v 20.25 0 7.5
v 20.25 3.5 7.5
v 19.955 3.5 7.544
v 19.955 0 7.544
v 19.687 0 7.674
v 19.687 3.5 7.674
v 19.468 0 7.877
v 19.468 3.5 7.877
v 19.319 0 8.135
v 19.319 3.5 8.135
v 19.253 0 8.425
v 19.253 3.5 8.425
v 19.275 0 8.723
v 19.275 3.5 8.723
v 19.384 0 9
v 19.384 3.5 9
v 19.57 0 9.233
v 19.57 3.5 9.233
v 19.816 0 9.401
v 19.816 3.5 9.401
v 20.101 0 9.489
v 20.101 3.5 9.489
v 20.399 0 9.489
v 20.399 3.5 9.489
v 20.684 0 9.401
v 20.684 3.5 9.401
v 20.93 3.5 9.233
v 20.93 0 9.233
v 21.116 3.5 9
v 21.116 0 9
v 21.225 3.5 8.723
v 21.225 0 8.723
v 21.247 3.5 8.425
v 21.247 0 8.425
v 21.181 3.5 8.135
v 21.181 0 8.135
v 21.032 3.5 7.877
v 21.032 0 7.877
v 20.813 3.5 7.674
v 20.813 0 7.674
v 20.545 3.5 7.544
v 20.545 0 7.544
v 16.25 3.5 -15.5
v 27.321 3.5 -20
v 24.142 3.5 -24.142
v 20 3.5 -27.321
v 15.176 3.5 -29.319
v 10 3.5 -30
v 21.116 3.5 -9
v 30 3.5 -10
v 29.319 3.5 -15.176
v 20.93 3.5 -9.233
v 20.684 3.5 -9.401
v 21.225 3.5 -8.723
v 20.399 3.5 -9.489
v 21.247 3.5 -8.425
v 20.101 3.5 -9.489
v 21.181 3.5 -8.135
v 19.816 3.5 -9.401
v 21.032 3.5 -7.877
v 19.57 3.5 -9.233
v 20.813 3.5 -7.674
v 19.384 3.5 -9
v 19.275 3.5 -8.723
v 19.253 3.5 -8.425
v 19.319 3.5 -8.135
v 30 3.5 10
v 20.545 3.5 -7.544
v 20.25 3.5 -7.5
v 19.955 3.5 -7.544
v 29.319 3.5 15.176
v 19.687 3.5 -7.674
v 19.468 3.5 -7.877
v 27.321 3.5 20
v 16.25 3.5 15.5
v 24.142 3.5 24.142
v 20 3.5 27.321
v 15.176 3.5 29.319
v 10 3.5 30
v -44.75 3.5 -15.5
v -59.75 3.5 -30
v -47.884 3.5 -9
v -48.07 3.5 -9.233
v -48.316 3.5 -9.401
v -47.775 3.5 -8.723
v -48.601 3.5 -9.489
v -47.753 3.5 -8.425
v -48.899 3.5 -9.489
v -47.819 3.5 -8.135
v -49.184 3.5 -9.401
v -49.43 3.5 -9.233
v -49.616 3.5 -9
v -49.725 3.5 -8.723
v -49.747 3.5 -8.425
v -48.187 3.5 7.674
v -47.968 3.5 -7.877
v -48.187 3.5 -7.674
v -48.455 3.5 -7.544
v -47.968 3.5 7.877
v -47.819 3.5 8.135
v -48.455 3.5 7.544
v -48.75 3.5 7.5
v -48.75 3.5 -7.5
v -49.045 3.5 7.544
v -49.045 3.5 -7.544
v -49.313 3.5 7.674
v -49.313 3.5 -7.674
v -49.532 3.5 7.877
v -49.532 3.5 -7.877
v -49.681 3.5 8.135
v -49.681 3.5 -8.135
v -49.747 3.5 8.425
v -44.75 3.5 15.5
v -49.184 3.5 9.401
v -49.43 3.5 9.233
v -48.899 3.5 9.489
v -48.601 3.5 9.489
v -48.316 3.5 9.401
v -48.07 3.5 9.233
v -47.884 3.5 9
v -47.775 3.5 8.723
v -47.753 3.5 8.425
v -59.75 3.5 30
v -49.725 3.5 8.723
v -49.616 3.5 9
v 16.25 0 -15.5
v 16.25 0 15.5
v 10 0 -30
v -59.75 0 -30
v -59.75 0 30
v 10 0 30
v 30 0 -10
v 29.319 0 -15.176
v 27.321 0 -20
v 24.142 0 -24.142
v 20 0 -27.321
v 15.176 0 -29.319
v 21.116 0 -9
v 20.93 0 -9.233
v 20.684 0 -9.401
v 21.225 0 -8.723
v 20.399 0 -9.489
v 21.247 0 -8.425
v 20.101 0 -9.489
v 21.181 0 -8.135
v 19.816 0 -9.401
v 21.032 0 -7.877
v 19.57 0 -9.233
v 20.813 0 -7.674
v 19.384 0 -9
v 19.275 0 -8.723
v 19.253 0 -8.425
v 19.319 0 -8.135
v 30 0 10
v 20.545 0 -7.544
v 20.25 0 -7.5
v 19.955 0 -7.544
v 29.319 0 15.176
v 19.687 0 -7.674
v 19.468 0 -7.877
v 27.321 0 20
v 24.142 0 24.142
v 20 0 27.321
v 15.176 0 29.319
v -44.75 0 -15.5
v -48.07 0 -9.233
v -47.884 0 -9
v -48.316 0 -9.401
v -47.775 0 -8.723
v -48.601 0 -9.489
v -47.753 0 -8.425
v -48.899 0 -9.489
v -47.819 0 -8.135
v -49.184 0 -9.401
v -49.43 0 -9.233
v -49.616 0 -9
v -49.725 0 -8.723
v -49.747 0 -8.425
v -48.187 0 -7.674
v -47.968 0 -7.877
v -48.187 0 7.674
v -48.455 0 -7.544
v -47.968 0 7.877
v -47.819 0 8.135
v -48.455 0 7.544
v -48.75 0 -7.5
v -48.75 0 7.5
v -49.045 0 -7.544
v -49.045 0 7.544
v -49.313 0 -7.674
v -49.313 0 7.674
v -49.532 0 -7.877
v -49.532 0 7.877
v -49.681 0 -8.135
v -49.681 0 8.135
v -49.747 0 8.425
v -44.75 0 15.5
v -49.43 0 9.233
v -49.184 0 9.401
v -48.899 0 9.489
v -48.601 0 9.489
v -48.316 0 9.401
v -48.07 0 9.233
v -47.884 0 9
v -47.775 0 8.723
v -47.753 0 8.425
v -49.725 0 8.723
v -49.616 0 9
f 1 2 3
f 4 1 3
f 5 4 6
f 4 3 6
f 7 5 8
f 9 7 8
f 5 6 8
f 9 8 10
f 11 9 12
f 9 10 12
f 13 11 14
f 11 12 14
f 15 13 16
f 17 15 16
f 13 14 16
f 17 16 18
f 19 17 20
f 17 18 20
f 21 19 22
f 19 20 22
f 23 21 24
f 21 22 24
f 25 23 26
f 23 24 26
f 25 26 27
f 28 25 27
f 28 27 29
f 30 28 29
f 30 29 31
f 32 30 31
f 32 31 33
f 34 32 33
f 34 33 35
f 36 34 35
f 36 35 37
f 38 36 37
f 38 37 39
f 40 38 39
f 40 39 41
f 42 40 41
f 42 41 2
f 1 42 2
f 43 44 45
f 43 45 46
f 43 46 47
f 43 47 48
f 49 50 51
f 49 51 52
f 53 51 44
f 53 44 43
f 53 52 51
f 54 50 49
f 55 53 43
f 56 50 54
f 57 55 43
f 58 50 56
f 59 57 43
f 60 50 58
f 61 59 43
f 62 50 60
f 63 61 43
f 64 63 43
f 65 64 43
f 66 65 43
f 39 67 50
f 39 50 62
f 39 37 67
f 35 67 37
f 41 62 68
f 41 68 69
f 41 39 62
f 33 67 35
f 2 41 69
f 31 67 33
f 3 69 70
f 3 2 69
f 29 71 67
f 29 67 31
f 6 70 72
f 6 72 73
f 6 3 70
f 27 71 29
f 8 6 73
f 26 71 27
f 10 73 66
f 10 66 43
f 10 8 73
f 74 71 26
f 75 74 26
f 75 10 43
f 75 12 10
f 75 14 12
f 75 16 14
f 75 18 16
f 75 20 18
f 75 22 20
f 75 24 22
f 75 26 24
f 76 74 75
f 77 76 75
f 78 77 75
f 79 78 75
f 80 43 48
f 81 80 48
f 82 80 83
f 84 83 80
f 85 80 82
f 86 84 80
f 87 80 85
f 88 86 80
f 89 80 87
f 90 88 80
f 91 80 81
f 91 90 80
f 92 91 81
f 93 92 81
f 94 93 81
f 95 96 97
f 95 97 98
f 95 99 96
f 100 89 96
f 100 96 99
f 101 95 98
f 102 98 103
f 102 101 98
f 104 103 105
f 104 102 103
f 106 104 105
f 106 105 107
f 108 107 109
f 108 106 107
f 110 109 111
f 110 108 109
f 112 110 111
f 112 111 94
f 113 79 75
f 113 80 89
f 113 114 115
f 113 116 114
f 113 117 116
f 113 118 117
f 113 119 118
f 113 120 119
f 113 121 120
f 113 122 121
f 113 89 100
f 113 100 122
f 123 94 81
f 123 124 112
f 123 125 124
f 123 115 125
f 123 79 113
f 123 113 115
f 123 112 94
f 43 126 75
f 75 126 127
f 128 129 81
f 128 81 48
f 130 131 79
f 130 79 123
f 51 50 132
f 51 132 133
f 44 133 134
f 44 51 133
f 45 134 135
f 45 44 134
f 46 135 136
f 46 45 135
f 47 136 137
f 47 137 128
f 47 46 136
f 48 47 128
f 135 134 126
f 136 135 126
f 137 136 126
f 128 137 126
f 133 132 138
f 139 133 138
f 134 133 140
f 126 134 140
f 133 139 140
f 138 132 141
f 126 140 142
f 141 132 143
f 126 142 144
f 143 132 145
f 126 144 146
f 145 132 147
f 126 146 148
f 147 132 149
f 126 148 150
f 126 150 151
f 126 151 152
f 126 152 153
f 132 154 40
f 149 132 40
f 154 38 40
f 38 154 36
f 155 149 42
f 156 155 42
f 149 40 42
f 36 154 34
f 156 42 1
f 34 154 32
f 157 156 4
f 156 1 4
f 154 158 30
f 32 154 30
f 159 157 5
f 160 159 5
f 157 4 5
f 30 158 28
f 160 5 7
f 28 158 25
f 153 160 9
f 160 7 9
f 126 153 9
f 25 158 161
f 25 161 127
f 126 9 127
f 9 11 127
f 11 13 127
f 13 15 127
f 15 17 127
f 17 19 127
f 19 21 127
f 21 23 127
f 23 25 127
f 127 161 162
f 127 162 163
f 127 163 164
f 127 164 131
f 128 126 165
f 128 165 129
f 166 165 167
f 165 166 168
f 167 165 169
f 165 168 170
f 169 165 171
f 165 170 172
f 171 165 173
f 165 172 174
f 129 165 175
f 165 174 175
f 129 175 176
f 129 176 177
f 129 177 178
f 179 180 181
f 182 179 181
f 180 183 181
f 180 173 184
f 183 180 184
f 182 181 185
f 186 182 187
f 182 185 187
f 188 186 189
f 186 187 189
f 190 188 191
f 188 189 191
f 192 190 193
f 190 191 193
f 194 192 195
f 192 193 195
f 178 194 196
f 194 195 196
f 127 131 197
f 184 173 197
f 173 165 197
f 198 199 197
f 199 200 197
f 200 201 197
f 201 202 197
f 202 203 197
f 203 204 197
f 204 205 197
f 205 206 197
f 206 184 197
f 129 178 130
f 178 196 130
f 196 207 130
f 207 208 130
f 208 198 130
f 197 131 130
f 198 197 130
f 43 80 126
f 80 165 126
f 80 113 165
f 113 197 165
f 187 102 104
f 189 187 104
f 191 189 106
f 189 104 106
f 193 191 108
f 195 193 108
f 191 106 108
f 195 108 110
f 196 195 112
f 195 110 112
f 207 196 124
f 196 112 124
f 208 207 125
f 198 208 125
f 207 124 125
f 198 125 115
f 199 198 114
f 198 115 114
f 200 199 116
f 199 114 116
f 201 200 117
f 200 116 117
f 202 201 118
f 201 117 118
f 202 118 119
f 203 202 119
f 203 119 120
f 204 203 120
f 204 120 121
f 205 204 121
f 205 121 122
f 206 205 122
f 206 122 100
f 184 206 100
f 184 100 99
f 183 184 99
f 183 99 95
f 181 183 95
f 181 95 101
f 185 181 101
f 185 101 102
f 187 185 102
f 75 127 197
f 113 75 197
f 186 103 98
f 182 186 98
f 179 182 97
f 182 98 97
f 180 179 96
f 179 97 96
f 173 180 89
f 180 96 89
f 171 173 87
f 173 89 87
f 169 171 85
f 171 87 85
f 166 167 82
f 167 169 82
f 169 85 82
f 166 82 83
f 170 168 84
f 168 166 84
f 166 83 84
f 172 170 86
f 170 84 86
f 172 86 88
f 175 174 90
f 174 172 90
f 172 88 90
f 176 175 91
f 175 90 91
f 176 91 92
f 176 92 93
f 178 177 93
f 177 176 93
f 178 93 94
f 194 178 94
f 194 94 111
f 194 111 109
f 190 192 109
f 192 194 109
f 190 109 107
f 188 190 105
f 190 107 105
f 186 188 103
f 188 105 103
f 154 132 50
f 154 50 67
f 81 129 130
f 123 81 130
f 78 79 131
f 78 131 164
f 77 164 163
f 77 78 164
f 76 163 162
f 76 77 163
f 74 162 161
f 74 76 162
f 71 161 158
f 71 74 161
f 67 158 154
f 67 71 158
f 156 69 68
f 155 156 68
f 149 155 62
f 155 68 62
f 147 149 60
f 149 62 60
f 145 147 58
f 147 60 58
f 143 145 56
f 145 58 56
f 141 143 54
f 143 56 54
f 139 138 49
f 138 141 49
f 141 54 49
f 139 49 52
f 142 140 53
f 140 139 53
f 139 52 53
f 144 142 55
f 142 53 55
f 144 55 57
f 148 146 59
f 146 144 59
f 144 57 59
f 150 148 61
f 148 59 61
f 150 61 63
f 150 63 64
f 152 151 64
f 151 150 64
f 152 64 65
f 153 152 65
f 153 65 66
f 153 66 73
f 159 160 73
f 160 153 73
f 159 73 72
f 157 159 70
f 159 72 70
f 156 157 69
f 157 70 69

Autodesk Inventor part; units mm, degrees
ref_plane "YZ Plane" through (0, 0, 0) normal (1, 0, 0) x (0, 1, 0)
ref_plane "XZ Plane" through (0, 0, 0) normal (0, 1, 0) x (-1, 0, 0)
ref_plane "XY Plane" through (0, 0, 0) normal (0, 0, 1) x (1, 0, 0)
sketch "Sketch1" plane through (0, 0, 0) normal (0, 1, 0) x (-1, 0, 0)
  line L0 (0, 0) -> (-16.25, 0)
  line L1 (0, 0) -> (44.75, 0)
  line L2 (300, 0) -> (330, 0) construction
  line L3 (330, 30) -> (-30, 30) construction
  line L4 (-16.25, 15.5) -> (44.75, 15.5)
  line L5 (44.75, 15.5) -> (44.75, 0)
  line L6 (44.75, -15.5) -> (-16.25, -15.5)
  line L7 (-16.25, -15.5) -> (-16.25, 0)
  line L8 (-16.25, 15.5) -> (44.75, -15.5) construction
  line L9 (44.75, 15.5) -> (-16.25, -15.5) construction
  line L10 (-20.25, 8.5) -> (48.75, 8.5) construction
  line L11 (48.75, 8.5) -> (48.75, -8.5) construction
  line L12 (48.75, -8.5) -> (-20.25, -8.5) construction
  line L13 (-20.25, -8.5) -> (-20.25, 8.5) construction
  line L14 (-20.25, 8.5) -> (48.75, -8.5) construction
  line L15 (48.75, 8.5) -> (-20.25, -8.5) construction
  line L16 (-30, 0) -> (-30, 30)
  line L17 (330, 0) -> (330, 30) construction
  line L18 (44.75, 0) -> (300, 0) construction
  line L19 (44.75, 0) -> (44.75, -15.5)
  line L20 (-16.25, 0) -> (-30, 0)
  line L21 (-16.25, 0) -> (-16.25, 15.5)
  line L22 (300, 0) -> (300, 18.5) construction
  line L23 (0, 0) -> (-30, 0) construction
  line L24 (44.75, 0) -> (59.75, 0)
  line L25 (59.75, 0) -> (59.75, 30)
  line L26 (-30, 30) -> (59.75, 30)
  point P0 (14.25, 0)
  point P1 (14.25, 0)
  point P2 (285, 0)
  dimension "d0" = 300
  dimension "d5" = 61
  dimension "d6" = 31
  dimension "d7" = 69
  dimension "d8" = 17
  dimension "d9" = 16.25
  dimension "d10" = 30
  dimension "d11" = 30
  dimension "d20" = 18.5
  dimension "d21" = 15
  dimension "d29" = 15
extrude "Extrusion1" add sketch "Sketch1" along normal blind 3.5 contours L20 L16 L26 L25 L24 L5 L4 L21
hole "Hole1" at (20.25, 0, 8.5) at (-48.75, 0, 8.5) direction (0, 1, 0) diameter 2 end through all
fillet "Fillet1" radius 20 1 edges at (30, 1.75, 30)
mirror "Mirror1" about plane through (30, 0, 0) normal (0, 0, -1)
properties part number "segment1c" material "Plywood, Finish"
